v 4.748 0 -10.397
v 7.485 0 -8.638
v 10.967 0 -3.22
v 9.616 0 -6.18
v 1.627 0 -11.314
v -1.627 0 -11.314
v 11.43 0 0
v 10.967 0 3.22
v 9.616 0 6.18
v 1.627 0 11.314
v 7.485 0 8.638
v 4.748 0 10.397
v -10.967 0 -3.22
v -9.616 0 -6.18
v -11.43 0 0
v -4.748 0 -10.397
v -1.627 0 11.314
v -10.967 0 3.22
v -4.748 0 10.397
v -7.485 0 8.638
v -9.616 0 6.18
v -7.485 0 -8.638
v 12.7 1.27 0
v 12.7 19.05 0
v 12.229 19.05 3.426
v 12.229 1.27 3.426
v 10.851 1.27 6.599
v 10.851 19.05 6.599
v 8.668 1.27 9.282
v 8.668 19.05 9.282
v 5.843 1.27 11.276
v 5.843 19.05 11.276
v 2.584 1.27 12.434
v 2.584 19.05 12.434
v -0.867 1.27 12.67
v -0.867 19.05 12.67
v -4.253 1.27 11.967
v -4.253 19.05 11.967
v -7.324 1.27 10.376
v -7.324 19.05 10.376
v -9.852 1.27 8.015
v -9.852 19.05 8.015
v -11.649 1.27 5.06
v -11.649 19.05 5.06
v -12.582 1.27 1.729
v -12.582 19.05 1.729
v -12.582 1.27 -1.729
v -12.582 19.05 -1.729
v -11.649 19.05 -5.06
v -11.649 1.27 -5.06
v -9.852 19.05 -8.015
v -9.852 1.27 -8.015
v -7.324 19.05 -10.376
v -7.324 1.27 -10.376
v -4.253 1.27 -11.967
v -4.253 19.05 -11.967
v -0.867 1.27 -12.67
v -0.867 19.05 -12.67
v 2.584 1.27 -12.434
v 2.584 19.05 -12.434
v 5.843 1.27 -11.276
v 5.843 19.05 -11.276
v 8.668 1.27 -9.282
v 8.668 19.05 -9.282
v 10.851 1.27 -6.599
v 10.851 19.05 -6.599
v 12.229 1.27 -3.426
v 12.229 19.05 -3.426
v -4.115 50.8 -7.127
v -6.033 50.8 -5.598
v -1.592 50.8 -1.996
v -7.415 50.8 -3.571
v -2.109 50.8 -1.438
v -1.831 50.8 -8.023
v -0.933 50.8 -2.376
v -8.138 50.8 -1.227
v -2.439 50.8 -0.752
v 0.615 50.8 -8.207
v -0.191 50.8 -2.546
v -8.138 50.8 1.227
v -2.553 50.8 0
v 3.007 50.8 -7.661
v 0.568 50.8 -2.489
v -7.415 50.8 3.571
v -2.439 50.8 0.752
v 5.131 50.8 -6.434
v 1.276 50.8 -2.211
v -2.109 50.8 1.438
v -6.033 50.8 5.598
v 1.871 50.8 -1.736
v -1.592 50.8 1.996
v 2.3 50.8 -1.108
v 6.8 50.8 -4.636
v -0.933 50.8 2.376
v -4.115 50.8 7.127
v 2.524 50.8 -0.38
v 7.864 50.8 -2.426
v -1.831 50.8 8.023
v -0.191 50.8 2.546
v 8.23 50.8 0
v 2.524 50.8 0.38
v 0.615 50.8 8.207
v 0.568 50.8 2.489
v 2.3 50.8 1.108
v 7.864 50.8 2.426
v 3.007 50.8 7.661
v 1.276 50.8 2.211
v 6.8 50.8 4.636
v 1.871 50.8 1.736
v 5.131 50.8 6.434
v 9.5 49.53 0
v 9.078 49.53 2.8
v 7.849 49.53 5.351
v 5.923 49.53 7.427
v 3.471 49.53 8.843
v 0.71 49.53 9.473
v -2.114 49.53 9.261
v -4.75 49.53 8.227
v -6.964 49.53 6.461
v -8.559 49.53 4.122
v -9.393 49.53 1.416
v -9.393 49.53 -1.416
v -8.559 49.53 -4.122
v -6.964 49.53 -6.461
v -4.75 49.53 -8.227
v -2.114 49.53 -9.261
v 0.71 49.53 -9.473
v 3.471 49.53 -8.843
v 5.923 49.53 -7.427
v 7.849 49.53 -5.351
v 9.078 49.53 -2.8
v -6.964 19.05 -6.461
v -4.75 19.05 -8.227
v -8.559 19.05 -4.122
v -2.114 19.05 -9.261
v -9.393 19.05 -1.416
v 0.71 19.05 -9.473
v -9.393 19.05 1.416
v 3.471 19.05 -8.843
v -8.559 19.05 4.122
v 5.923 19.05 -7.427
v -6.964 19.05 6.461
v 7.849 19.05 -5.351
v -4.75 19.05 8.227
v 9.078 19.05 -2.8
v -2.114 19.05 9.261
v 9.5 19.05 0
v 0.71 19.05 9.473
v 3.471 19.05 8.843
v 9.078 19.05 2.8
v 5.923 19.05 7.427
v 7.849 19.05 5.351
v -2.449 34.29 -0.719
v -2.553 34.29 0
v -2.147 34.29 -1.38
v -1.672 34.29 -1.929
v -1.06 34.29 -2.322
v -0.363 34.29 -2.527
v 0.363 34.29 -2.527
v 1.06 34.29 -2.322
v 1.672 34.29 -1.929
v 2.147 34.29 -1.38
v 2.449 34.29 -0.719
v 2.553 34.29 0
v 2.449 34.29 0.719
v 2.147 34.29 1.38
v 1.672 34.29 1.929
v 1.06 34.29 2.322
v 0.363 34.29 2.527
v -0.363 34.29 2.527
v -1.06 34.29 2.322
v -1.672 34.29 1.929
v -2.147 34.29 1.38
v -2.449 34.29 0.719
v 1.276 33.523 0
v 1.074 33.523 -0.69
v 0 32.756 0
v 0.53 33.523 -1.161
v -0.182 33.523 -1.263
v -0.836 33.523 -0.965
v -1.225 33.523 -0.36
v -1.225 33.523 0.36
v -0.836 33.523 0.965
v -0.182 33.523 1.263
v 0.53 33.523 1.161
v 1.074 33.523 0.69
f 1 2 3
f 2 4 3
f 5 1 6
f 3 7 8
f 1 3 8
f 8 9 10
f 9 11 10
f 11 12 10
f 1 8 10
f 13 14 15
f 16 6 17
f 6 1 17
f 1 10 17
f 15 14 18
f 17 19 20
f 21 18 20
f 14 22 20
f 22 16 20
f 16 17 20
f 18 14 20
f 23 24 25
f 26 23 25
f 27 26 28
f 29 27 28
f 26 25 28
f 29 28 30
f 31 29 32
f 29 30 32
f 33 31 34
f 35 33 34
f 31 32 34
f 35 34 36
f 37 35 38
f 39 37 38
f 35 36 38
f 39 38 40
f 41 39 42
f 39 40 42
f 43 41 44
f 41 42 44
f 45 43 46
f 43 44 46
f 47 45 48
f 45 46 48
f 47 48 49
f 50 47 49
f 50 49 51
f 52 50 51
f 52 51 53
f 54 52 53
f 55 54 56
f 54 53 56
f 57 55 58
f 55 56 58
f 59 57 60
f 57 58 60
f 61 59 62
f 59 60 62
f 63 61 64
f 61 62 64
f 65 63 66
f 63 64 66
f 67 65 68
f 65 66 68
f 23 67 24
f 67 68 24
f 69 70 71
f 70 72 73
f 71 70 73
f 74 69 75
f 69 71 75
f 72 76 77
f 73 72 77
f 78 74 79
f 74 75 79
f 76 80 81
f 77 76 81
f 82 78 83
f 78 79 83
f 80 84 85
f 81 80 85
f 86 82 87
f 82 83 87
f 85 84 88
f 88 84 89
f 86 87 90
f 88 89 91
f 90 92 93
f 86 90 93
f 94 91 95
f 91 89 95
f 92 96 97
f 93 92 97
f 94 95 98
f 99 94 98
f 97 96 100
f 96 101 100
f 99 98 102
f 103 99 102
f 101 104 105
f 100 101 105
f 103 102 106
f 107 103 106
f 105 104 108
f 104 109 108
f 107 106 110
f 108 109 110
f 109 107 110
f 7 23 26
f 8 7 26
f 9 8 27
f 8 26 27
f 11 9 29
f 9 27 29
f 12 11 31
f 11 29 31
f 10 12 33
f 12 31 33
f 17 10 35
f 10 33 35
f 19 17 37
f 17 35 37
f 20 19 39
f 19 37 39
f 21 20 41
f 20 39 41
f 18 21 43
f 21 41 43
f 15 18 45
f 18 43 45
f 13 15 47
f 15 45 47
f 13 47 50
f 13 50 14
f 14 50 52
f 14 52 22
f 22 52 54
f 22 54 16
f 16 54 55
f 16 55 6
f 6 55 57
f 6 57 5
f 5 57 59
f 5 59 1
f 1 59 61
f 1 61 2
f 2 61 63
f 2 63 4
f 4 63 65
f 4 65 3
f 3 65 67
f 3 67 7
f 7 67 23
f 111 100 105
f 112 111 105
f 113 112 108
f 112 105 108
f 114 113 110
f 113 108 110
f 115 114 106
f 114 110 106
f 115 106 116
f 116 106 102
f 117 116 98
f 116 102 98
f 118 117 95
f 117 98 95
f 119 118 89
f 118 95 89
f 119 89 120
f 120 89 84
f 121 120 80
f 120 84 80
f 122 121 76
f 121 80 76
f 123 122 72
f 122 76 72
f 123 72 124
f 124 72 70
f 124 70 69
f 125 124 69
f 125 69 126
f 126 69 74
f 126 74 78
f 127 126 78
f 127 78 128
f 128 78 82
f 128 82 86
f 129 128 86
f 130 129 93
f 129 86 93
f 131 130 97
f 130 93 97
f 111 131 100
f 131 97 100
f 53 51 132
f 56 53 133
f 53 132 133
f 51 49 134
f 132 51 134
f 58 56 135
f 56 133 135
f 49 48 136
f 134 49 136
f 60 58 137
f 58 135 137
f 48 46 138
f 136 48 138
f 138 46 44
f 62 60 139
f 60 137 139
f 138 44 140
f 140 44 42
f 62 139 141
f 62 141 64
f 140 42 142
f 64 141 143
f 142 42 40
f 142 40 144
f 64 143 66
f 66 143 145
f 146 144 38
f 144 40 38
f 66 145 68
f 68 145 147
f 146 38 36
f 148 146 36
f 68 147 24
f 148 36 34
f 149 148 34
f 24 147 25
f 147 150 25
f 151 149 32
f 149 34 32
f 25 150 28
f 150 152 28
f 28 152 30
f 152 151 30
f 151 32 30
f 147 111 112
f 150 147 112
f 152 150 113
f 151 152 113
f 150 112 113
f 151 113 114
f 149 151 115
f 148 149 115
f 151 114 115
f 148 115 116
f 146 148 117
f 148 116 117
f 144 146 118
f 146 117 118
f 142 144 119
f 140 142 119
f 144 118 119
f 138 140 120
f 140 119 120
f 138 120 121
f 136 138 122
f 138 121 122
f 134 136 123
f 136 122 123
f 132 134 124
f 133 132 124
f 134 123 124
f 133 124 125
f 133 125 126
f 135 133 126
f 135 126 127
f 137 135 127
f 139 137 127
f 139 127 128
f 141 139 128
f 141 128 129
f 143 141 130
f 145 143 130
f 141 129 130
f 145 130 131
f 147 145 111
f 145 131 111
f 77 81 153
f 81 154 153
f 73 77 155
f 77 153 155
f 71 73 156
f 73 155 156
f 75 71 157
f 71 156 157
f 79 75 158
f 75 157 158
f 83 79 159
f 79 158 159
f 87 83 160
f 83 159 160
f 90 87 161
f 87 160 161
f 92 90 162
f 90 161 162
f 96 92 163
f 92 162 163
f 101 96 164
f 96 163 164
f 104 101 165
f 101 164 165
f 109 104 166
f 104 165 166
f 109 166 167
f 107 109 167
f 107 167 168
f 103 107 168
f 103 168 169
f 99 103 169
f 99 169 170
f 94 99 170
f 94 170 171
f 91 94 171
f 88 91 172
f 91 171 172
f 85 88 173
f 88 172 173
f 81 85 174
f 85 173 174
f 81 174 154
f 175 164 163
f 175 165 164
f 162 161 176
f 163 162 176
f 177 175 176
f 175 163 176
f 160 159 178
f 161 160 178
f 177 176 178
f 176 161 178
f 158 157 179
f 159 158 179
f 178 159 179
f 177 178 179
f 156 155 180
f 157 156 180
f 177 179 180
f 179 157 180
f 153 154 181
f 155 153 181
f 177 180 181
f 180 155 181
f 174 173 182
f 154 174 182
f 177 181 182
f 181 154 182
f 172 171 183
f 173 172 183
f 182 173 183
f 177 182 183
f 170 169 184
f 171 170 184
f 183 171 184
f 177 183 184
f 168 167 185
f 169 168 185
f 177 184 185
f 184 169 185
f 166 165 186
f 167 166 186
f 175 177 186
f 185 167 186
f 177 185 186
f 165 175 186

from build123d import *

# Parameters (mm, degrees)
CHAMFER1_SIZE               = 1.27
F_1_4_20_TAPPED_HOLE1_D     = 5.1054
F_1_4_20_TAPPED_HOLE1_DEPTH = 16.51
F_1_4_20_TAPPED_HOLE1_TIP   = 1.533816902


with BuildPart() as part:
    # Sketch1 → Revolve1 (revolve)
    with BuildSketch(Plane.XY):
        Polygon((0, 0), (12.7, 0), (12.7, 19.05), (9.4996, 19.05), (9.4996, 50.8), (0, 50.8), align=None)
    revolve(axis=Axis((0, 50.8, 0), (0, -1, 0)))

    # Chamfer1
    chamfer1_edges = [part.edges().sort_by_distance(p)[0] for p in [
        (-9.4996, 50.8, 0),
        (-12.7, 0, 0),
    ]]
    chamfer(chamfer1_edges, length=CHAMFER1_SIZE)

    # 1/4-20 Tapped Hole1
    with Locations(Plane(origin=(0, 50.8, 0), x_dir=(1, 0, 0), z_dir=(0, 1, 0))):
        with Locations((0, 0)):
            Hole(F_1_4_20_TAPPED_HOLE1_D / 2, depth=F_1_4_20_TAPPED_HOLE1_DEPTH)
            with Locations((0, 0, -(F_1_4_20_TAPPED_HOLE1_DEPTH + F_1_4_20_TAPPED_HOLE1_TIP / 2))):  # 118° drill point
                Cone(0, F_1_4_20_TAPPED_HOLE1_D / 2, F_1_4_20_TAPPED_HOLE1_TIP, mode=Mode.SUBTRACT)


solid = part.part
